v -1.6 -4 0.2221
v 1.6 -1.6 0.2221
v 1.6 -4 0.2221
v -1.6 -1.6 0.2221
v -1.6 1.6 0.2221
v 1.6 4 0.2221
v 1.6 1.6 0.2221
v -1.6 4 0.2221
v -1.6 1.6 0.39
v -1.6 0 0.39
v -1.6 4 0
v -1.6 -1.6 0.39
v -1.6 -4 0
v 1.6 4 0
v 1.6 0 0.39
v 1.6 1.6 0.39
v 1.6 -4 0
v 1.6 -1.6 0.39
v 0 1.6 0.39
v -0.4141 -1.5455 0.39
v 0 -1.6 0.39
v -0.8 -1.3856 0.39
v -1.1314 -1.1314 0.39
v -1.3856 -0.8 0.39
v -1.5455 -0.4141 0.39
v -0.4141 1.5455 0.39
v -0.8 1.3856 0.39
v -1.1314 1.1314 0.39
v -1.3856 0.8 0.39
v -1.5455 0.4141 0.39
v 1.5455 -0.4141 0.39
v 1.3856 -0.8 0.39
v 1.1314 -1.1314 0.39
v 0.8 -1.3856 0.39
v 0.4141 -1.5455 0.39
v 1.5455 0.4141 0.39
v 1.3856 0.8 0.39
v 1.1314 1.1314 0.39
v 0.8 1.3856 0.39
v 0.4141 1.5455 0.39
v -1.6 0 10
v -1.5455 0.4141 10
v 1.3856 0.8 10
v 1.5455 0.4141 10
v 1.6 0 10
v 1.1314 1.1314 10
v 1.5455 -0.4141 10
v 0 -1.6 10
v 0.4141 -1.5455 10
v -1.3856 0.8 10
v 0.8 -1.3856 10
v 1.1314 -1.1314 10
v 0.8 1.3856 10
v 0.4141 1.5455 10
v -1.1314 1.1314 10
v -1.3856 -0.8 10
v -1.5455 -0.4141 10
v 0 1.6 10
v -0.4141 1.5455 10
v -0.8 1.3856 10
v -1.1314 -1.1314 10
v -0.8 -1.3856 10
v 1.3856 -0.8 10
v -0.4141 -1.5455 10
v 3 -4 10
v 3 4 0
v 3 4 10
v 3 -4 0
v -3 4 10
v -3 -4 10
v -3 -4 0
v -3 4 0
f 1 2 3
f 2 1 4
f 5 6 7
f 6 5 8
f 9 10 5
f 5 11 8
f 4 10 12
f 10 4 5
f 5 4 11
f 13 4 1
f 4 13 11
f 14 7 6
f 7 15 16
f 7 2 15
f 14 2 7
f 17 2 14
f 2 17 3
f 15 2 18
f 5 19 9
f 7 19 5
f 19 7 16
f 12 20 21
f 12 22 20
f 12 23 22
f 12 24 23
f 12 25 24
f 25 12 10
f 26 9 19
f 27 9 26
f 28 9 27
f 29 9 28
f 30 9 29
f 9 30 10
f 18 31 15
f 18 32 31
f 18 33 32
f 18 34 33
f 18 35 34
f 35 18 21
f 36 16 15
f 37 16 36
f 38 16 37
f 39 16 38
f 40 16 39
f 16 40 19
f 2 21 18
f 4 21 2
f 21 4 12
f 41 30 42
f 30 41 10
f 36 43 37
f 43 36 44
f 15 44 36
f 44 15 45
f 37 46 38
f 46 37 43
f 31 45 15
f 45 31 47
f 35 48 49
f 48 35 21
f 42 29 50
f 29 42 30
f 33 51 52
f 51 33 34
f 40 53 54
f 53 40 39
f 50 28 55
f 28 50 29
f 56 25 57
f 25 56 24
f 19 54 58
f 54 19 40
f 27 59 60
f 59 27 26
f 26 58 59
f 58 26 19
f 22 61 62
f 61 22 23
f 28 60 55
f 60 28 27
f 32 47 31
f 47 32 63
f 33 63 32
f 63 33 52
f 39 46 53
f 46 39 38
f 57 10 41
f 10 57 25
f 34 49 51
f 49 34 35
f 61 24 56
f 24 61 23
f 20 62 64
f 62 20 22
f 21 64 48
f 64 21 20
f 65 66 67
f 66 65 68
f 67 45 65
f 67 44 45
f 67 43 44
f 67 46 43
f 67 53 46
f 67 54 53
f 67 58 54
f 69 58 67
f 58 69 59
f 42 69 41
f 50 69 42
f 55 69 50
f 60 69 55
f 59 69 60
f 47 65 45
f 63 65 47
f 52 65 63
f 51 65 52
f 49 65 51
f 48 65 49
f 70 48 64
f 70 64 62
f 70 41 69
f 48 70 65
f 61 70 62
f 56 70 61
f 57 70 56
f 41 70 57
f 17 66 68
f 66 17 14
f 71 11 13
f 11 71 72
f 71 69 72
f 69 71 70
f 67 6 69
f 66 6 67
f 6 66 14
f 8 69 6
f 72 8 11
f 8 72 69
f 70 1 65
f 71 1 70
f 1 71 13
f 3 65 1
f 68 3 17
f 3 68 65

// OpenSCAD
// file: basic_shapes.scad
include <values.scad>;

module hole_array(xs, diameter, height, y = 0, z = 0, square = false) {
    for (x = xs) {
        translate([x, y, z]) {
            if (square) {
                translate([diameter / -2, diameter / -2, 0]) {
                    cube([diameter, diameter, height]);
                }
            } else {
                cylinder(d = diameter, h = height);
            }
        }
    }
}

module spacer_array(
    positions,
    height,
    wall = 2,
    hole_diameter = PCB_MOUNT_HOLE_DIAMETER,
    z = 0,
    $fn = DEFAULT_ROUNDING
) {
    for (position = positions) {
        translate([position.x, position.y, z]) {
            ring(
                diameter = hole_diameter + wall * 2,
                inner_diameter = hole_diameter,
                height = height
            );
        }
    }
}

module flat_top_rectangular_pyramid(
    top_width = 0,
    top_length = 0,

    bottom_width = 0,
    bottom_length = 0,

    height = 0,

    top_x = undef,
    top_y = undef,

    top_weight_x = .5,
    top_weight_y = .5
) {
    top_x = top_x != undef
        ? top_x
        : (bottom_width - top_width) * top_weight_x;
    top_y = top_y != undef
        ? top_y
        : (bottom_length - top_length) * top_weight_y;

    max_difference = max(bottom_width - top_width, bottom_length - top_length);
    height = height == undef
        ? max_difference / 2
        : height;

    polyhedron(
        [
            [0, 0, 0],
            [bottom_width, 0, 0],
            [bottom_width, bottom_length, 0],
            [0, bottom_length, 0],
            [top_x, top_y, height],
            [top_width + top_x, top_y, height],
            [top_width + top_x, top_length + top_y, height],
            [top_x, top_length + top_y, height]
        ], [
            [0, 1, 2, 3],
            [4, 5, 1, 0],
            [7, 6, 5, 4],
            [5, 6, 2, 1],
            [6, 7, 3, 2],
            [7, 4, 0, 3]
        ]
    );
}

module rounded_cube(dimensions, radius, $fn = $fn) {
    positions = [
        [radius, radius, radius],
        [dimensions.x - radius, radius, radius],
        [dimensions.x - radius, dimensions.y - radius, radius],
        [radius, dimensions.y - radius, radius],
        [radius, radius, dimensions.z - radius],
        [dimensions.x - radius, radius, dimensions.z - radius],
        [dimensions.x - radius, dimensions.y - radius, dimensions.z - radius],
        [radius, dimensions.y - radius, dimensions.z - radius],
    ];

    if (radius > 0) {
        hull() {
            for (position = positions) {
                translate(position) sphere(r = radius);
            }
        }
    } else {
        cube(dimensions);
    }
}

module support_wall(
    dimensions,
    is_back = true,
    railing_diameter = 3.5,
    support_width = 2,
    support_length = 4,
    gutter = 4
) {
    railing_z = railing_diameter / 4;

    module _support(height = dimensions[2], depth = support_length) {
        translate([0, -depth, 0]) {
            flat_top_rectangular_pyramid(
                top_width = support_width,
                top_length = 0,
                bottom_width = support_width,
                bottom_length = support_length,
                height = height,
                top_weight_y = 1
            );
        }
    }

    translate(is_back ? [0, dimensions[1], 0] : [0, 0, 0]) {
        mirror(is_back ? [0, 1, 0] : [0, 0, 0]) {
            cube(dimensions);

            translate([0, dimensions[1] / 2, dimensions[2] + railing_z]) {
                rotate([0, 90, 0]) {
                    cylinder(
                        d = railing_diameter,
                        h = dimensions[0],
                        $fn = 9
                    );
                }
            }

            translate([gutter, 0, 0]) {
                _support();
            }
            translate([dimensions[0] - support_length - gutter, 0, 0]) {
                _support();
            }
        }
    }
}

module ring(
    diameter,
    height,
    thickness, inner_diameter = 0
) {
    e = 0.034;
    thickness = thickness != undef
        ? thickness
        : (diameter - inner_diameter) / 2;

    difference() {
        cylinder(d = diameter, h = height);

        translate([0, 0, -e]) {
            cylinder(d = diameter - thickness * 2, h = height + e * 2);
        }
    }
}

module cylinder_grip(
    diameter,
    height,
    count,
    rotation_offset = 0,
    size = 1,
    $fn = undef
) {
    if (size > 0) {
        count = count != undef
            ? count
            : floor((diameter * PI) / size / 2);

        for (i = [0 : count - 1]) {
            rotate([0, 0, rotation_offset + 360 * i / count]) {
                translate([0, diameter / 2, 0]) {
                    cylinder(d = size, h = height);
                }
            }
        }
    }
}

module rounded_corner_cutoff(height, radius, angle = 0, e = 1.123, $fn = $fn) {
    difference() {
        rotate([0, 0, angle]) {
            cube([radius + e, radius + e, height]);
        }

        translate([0, 0, -e]) {
            cylinder(r = radius, h = height + e * 2);
        }
    }
}

rounded_corner_cutoff(height = 15, radius = 5);
// file: values.scad
DEFAULT_ROUNDING = 24;
HIDEF_ROUNDING = 120;

SACRIFICIAL_BRIDGE_HEIGHT = .2;
BREAKAWAY_SUPPORT_DEPTH = .5;
BREAKAWAY_SUPPORT_GUTTER = 1;
BREAKAWAY_SUPPORT_DISTANCE = 10;

PCB_WIDTH = 183.954;
PCB_LENGTH = 120.142;
PCB_HEIGHT = 1.6;
PCB_MOUNT_HOLE_DIAMETER = 3.2;

PCB_BATTERY_CAVITY_X = 135.382;
PCB_BATTERY_CAVITY_Y = 54.102;
PCB_BATTERY_CAVITY_LENGTH = PCB_LENGTH - PCB_BATTERY_CAVITY_Y + 1;

PCB_COMPONENTS_X = 2.54;
PCB_COMPONENTS_Y = 33.528;
PCB_COMPONENTS_WIDTH = PCB_BATTERY_CAVITY_X - PCB_COMPONENTS_X - 2.54 * 2;
PCB_COMPONENTS_LENGTH = PCB_LENGTH - PCB_COMPONENTS_Y - 2.54;
PCB_COMPONENTS_HEIGHT = 12;

PCB_SWITCH_X = 168.148;
PCB_SWITCH_Y = 9.148;

PCB_LED_X = 158.75;
PCB_LED_Y = 36.576;

BUTTON_DIAMETER = 6;
BUTTON_LENGTH = 6.6;
BUTTON_WIDTH = 4.5;
BUTTON_HEIGHT = 6;

POT_HEIGHT = 7.8;

/* Commented out lines are on PCB but not needed for assembly */
TOP_MOUNTED_PCB_HOLES = [
    [8.164, 3.048],
    /* [46.264, 3.048], */
    [64.044, 3.048],
    /* [137.704, 3.048], */
    [119.924, 3.048],
    [175.804, 3.048],
];

BOTTOM_MOUNTED_PCB_HOLES = [
    [8.164, 27.94],
    [64.044, 27.94],
    [175.804, 27.94],
    [119.924, 27.94],
];

BACK_PCB_HOLES = [
    [26.416, 98.298],
    [108.712, 98.298],
];

WIRE_RELIEF_HOLES = [
    [172.466, 50.038],
    [164.338, 50.038],
];

PCB_HOLES = concat(
    TOP_MOUNTED_PCB_HOLES,
    BOTTOM_MOUNTED_PCB_HOLES,
    BACK_PCB_HOLES,
    WIRE_RELIEF_HOLES
);

PCB_BUTTONS = [
    [10.414, 14.224 - BUTTON_LENGTH],
    [18.034, 19.304 - BUTTON_LENGTH],
    [25.654, 14.224 - BUTTON_LENGTH],
    [33.274, 19.304 - BUTTON_LENGTH],
    [40.894, 14.224 - BUTTON_LENGTH],
    [48.514, 19.304 - BUTTON_LENGTH],
    [56.134, 14.224 - BUTTON_LENGTH],
    [71.374, 14.224 - BUTTON_LENGTH],
    [78.994, 19.304 - BUTTON_LENGTH],
    [86.614, 14.224 - BUTTON_LENGTH],
    [94.234, 19.304 - BUTTON_LENGTH],
    [101.854, 14.224 - BUTTON_LENGTH],
    [117.094, 14.224 - BUTTON_LENGTH],
    [124.714, 19.304 - BUTTON_LENGTH],
    [132.334, 14.224 - BUTTON_LENGTH],
    [139.954, 19.304 - BUTTON_LENGTH],
    [147.574, 14.224 - BUTTON_LENGTH],
    [155.194, 19.304 - BUTTON_LENGTH],
    [162.814, 14.224 - BUTTON_LENGTH],
    [178.054, 14.224 - BUTTON_LENGTH],
];

PCB_VOLUME_WHEEL_X = 179.578;
PCB_VOLUME_WHEEL_Y = 42.164;

SCREW_HEAD_DIAMETER = 6;
SCREW_HEAD_HEIGHT = 2.1;
NUT_DIAMETER = 6.4;
NUT_HEIGHT = 2.4;

DEFAULT_NUT_LOCK_HEIGHT_CLEARANCE = .1;
DEFAULT_NUT_LOCK_DIAMETER_CLEARANCE = .1;

MOUNT_STILT_MINIMUM_HEIGHT = NUT_HEIGHT + .5 + 2; // TODO: tidy against mount_stilt args

NATURAL_KEY_SEQUENCES = [
    [1,0,1,0,1,1,0,1,0,1,0,1,],
    [0,1,0,1,1,0,1,0,1,0,1,1,],
    [1,0,1,1,0,1,0,1,0,1,1,0,],
    [0,1,1,0,1,0,1,0,1,1,0,1,],
    [1,1,0,1,0,1,0,1,1,0,1,0,],
    [1,0,1,0,1,0,1,1,0,1,0,1,],
    [0,1,0,1,0,1,1,0,1,0,1,1,],
    [1,0,1,0,1,1,0,1,0,1,1,0,],
    [0,1,0,1,1,0,1,0,1,1,0,1,],
    [1,0,1,1,0,1,0,1,1,0,1,0,],
    [0,1,1,0,1,0,1,1,0,1,0,1,],
    [1,1,0,1,0,1,1,0,1,0,1,0,],
];

HINGE_CLASP_DEFAULT_PIN_DIAMETER = 1.75; // filament diameter
HINGE_CLASP_DEFAULT_MINIMAL_SUPPORT = 1.5;
HINGE_CLASP_MINIMUM_TOOTH_WIDTH = 5;
HINGE_CLASP_MINIMUM_TOOTH_COUNT = 5;
HINGE_CLASP_MINIMUM_WIDTH = HINGE_CLASP_MINIMUM_TOOTH_WIDTH
    * HINGE_CLASP_MINIMUM_TOOTH_COUNT;
MINIMUM_HINGE_CLASP_LENGTH = 20;

HINGE_CLASP_SIDE_FRONT_BACK = 0;
HINGE_CLASP_SIDE_LEFT_RIGHT = 1;

LIP_BOX_DEFAULT_LIP_HEIGHT = 3;

BATTERY_WIDTH = 48.6;
BATTERY_LENGTH = 25.8;
BATTERY_HEIGHT = 17.1;
BATTERY_SNAP_WIDTH = 4.2;

/* S20X35VFS */
SPEAKER_DIAMETER = 41.1;
SPEAKER_HEIGHT = 23.5;
SPEAKER_LENGTH = 71;
SPEAKER_CLEARANCE = 2;
SPEAKER_PLATE_HOLE_DIAMETER = 3.6;
SPEAKER_PLATE_HOLE_XY = 4;
SPEAKER_PLATE_HEIGHT = .8;
SPEAKER_RIM_DEPTH = 3.8;
SPEAKER_RIM_HEIGHT = 1.4 - .4; // explicitly undersizing for good fit
SPEAKER_CONE_DIAMETER = 38;
SPEAKER_MAGNET_DIAMETER = 22;
SPEAKER_MAGNET_HEIGHT = 7.5;

/* https://www.ckswitches.com/media/1428/os.pdf */
SWITCH_BASE_WIDTH = 4.4;
SWITCH_BASE_LENGTH = 8.7;
SWITCH_BASE_HEIGHT = 4.5;
SWITCH_ACTUATOR_WIDTH = 2;
SWITCH_ACTUATOR_LENGTH = 2.1;
SWITCH_ACTUATOR_HEIGHT = 3.8;
SWITCH_ACTUATOR_TRAVEL = 1.5;
SWITCH_ORIGIN = [SWITCH_BASE_WIDTH / 2, 6.36];

LED_DIAMETER = 5.9;
LED_HEIGHT = 8.6;

PENCIL_STAND_CAVITY_DIAMETER = 8.5;

PLASTICS_TOLERANCE = 1.524; // https://www.tapplastics.com/product/plastics/cut_to_size_plastic
WINDOW_PANE_HEIGHT = 25.4 * 1 / 8;

HITCH_DEFAULT_MOUNT_SCREW_HEAD_CLEARANCE = .1;
HITCH_DEFAULT_SCREW_FLOOR = .4;
HITCH_RECOMMENDED_MINIMUM_CAVITY_HEIGHT = SCREW_HEAD_HEIGHT
    + HITCH_DEFAULT_MOUNT_SCREW_HEAD_CLEARANCE
    + HITCH_DEFAULT_SCREW_FLOOR
    + (SCREW_HEAD_DIAMETER - PCB_MOUNT_HOLE_DIAMETER) / 2;
// main file
include <values.scad>;

use <basic_shapes.scad>;

module supportless_screw_cavity(
    height = undef,
    span = 10,
    angle = 0,
    diameter = PCB_MOUNT_HOLE_DIAMETER,
    $fn = DEFAULT_ROUNDING
) {
    e = .0321;

    if (height != undef) {
        cylinder(
            d = diameter,
            h = height
        );
    }

    rotate([0, 0, angle]) {
        translate([span / -2, diameter / -2, 0]) {
            cube([span, diameter, SACRIFICIAL_BRIDGE_HEIGHT + e]);
        }

        translate([diameter / -2, diameter / -2, SACRIFICIAL_BRIDGE_HEIGHT]) {
            cube([diameter, diameter, SACRIFICIAL_BRIDGE_HEIGHT]);
        }
    }
}

difference() {
    # translate([6 / -2, 8 / -2, 0]) cube([6, 8, 10]);

    translate([0, 0, -.01]) supportless_screw_cavity(
        span = 8 + .01 * 2,
        angle = 90,
        height = 10 + .01 * 2
    );
}
